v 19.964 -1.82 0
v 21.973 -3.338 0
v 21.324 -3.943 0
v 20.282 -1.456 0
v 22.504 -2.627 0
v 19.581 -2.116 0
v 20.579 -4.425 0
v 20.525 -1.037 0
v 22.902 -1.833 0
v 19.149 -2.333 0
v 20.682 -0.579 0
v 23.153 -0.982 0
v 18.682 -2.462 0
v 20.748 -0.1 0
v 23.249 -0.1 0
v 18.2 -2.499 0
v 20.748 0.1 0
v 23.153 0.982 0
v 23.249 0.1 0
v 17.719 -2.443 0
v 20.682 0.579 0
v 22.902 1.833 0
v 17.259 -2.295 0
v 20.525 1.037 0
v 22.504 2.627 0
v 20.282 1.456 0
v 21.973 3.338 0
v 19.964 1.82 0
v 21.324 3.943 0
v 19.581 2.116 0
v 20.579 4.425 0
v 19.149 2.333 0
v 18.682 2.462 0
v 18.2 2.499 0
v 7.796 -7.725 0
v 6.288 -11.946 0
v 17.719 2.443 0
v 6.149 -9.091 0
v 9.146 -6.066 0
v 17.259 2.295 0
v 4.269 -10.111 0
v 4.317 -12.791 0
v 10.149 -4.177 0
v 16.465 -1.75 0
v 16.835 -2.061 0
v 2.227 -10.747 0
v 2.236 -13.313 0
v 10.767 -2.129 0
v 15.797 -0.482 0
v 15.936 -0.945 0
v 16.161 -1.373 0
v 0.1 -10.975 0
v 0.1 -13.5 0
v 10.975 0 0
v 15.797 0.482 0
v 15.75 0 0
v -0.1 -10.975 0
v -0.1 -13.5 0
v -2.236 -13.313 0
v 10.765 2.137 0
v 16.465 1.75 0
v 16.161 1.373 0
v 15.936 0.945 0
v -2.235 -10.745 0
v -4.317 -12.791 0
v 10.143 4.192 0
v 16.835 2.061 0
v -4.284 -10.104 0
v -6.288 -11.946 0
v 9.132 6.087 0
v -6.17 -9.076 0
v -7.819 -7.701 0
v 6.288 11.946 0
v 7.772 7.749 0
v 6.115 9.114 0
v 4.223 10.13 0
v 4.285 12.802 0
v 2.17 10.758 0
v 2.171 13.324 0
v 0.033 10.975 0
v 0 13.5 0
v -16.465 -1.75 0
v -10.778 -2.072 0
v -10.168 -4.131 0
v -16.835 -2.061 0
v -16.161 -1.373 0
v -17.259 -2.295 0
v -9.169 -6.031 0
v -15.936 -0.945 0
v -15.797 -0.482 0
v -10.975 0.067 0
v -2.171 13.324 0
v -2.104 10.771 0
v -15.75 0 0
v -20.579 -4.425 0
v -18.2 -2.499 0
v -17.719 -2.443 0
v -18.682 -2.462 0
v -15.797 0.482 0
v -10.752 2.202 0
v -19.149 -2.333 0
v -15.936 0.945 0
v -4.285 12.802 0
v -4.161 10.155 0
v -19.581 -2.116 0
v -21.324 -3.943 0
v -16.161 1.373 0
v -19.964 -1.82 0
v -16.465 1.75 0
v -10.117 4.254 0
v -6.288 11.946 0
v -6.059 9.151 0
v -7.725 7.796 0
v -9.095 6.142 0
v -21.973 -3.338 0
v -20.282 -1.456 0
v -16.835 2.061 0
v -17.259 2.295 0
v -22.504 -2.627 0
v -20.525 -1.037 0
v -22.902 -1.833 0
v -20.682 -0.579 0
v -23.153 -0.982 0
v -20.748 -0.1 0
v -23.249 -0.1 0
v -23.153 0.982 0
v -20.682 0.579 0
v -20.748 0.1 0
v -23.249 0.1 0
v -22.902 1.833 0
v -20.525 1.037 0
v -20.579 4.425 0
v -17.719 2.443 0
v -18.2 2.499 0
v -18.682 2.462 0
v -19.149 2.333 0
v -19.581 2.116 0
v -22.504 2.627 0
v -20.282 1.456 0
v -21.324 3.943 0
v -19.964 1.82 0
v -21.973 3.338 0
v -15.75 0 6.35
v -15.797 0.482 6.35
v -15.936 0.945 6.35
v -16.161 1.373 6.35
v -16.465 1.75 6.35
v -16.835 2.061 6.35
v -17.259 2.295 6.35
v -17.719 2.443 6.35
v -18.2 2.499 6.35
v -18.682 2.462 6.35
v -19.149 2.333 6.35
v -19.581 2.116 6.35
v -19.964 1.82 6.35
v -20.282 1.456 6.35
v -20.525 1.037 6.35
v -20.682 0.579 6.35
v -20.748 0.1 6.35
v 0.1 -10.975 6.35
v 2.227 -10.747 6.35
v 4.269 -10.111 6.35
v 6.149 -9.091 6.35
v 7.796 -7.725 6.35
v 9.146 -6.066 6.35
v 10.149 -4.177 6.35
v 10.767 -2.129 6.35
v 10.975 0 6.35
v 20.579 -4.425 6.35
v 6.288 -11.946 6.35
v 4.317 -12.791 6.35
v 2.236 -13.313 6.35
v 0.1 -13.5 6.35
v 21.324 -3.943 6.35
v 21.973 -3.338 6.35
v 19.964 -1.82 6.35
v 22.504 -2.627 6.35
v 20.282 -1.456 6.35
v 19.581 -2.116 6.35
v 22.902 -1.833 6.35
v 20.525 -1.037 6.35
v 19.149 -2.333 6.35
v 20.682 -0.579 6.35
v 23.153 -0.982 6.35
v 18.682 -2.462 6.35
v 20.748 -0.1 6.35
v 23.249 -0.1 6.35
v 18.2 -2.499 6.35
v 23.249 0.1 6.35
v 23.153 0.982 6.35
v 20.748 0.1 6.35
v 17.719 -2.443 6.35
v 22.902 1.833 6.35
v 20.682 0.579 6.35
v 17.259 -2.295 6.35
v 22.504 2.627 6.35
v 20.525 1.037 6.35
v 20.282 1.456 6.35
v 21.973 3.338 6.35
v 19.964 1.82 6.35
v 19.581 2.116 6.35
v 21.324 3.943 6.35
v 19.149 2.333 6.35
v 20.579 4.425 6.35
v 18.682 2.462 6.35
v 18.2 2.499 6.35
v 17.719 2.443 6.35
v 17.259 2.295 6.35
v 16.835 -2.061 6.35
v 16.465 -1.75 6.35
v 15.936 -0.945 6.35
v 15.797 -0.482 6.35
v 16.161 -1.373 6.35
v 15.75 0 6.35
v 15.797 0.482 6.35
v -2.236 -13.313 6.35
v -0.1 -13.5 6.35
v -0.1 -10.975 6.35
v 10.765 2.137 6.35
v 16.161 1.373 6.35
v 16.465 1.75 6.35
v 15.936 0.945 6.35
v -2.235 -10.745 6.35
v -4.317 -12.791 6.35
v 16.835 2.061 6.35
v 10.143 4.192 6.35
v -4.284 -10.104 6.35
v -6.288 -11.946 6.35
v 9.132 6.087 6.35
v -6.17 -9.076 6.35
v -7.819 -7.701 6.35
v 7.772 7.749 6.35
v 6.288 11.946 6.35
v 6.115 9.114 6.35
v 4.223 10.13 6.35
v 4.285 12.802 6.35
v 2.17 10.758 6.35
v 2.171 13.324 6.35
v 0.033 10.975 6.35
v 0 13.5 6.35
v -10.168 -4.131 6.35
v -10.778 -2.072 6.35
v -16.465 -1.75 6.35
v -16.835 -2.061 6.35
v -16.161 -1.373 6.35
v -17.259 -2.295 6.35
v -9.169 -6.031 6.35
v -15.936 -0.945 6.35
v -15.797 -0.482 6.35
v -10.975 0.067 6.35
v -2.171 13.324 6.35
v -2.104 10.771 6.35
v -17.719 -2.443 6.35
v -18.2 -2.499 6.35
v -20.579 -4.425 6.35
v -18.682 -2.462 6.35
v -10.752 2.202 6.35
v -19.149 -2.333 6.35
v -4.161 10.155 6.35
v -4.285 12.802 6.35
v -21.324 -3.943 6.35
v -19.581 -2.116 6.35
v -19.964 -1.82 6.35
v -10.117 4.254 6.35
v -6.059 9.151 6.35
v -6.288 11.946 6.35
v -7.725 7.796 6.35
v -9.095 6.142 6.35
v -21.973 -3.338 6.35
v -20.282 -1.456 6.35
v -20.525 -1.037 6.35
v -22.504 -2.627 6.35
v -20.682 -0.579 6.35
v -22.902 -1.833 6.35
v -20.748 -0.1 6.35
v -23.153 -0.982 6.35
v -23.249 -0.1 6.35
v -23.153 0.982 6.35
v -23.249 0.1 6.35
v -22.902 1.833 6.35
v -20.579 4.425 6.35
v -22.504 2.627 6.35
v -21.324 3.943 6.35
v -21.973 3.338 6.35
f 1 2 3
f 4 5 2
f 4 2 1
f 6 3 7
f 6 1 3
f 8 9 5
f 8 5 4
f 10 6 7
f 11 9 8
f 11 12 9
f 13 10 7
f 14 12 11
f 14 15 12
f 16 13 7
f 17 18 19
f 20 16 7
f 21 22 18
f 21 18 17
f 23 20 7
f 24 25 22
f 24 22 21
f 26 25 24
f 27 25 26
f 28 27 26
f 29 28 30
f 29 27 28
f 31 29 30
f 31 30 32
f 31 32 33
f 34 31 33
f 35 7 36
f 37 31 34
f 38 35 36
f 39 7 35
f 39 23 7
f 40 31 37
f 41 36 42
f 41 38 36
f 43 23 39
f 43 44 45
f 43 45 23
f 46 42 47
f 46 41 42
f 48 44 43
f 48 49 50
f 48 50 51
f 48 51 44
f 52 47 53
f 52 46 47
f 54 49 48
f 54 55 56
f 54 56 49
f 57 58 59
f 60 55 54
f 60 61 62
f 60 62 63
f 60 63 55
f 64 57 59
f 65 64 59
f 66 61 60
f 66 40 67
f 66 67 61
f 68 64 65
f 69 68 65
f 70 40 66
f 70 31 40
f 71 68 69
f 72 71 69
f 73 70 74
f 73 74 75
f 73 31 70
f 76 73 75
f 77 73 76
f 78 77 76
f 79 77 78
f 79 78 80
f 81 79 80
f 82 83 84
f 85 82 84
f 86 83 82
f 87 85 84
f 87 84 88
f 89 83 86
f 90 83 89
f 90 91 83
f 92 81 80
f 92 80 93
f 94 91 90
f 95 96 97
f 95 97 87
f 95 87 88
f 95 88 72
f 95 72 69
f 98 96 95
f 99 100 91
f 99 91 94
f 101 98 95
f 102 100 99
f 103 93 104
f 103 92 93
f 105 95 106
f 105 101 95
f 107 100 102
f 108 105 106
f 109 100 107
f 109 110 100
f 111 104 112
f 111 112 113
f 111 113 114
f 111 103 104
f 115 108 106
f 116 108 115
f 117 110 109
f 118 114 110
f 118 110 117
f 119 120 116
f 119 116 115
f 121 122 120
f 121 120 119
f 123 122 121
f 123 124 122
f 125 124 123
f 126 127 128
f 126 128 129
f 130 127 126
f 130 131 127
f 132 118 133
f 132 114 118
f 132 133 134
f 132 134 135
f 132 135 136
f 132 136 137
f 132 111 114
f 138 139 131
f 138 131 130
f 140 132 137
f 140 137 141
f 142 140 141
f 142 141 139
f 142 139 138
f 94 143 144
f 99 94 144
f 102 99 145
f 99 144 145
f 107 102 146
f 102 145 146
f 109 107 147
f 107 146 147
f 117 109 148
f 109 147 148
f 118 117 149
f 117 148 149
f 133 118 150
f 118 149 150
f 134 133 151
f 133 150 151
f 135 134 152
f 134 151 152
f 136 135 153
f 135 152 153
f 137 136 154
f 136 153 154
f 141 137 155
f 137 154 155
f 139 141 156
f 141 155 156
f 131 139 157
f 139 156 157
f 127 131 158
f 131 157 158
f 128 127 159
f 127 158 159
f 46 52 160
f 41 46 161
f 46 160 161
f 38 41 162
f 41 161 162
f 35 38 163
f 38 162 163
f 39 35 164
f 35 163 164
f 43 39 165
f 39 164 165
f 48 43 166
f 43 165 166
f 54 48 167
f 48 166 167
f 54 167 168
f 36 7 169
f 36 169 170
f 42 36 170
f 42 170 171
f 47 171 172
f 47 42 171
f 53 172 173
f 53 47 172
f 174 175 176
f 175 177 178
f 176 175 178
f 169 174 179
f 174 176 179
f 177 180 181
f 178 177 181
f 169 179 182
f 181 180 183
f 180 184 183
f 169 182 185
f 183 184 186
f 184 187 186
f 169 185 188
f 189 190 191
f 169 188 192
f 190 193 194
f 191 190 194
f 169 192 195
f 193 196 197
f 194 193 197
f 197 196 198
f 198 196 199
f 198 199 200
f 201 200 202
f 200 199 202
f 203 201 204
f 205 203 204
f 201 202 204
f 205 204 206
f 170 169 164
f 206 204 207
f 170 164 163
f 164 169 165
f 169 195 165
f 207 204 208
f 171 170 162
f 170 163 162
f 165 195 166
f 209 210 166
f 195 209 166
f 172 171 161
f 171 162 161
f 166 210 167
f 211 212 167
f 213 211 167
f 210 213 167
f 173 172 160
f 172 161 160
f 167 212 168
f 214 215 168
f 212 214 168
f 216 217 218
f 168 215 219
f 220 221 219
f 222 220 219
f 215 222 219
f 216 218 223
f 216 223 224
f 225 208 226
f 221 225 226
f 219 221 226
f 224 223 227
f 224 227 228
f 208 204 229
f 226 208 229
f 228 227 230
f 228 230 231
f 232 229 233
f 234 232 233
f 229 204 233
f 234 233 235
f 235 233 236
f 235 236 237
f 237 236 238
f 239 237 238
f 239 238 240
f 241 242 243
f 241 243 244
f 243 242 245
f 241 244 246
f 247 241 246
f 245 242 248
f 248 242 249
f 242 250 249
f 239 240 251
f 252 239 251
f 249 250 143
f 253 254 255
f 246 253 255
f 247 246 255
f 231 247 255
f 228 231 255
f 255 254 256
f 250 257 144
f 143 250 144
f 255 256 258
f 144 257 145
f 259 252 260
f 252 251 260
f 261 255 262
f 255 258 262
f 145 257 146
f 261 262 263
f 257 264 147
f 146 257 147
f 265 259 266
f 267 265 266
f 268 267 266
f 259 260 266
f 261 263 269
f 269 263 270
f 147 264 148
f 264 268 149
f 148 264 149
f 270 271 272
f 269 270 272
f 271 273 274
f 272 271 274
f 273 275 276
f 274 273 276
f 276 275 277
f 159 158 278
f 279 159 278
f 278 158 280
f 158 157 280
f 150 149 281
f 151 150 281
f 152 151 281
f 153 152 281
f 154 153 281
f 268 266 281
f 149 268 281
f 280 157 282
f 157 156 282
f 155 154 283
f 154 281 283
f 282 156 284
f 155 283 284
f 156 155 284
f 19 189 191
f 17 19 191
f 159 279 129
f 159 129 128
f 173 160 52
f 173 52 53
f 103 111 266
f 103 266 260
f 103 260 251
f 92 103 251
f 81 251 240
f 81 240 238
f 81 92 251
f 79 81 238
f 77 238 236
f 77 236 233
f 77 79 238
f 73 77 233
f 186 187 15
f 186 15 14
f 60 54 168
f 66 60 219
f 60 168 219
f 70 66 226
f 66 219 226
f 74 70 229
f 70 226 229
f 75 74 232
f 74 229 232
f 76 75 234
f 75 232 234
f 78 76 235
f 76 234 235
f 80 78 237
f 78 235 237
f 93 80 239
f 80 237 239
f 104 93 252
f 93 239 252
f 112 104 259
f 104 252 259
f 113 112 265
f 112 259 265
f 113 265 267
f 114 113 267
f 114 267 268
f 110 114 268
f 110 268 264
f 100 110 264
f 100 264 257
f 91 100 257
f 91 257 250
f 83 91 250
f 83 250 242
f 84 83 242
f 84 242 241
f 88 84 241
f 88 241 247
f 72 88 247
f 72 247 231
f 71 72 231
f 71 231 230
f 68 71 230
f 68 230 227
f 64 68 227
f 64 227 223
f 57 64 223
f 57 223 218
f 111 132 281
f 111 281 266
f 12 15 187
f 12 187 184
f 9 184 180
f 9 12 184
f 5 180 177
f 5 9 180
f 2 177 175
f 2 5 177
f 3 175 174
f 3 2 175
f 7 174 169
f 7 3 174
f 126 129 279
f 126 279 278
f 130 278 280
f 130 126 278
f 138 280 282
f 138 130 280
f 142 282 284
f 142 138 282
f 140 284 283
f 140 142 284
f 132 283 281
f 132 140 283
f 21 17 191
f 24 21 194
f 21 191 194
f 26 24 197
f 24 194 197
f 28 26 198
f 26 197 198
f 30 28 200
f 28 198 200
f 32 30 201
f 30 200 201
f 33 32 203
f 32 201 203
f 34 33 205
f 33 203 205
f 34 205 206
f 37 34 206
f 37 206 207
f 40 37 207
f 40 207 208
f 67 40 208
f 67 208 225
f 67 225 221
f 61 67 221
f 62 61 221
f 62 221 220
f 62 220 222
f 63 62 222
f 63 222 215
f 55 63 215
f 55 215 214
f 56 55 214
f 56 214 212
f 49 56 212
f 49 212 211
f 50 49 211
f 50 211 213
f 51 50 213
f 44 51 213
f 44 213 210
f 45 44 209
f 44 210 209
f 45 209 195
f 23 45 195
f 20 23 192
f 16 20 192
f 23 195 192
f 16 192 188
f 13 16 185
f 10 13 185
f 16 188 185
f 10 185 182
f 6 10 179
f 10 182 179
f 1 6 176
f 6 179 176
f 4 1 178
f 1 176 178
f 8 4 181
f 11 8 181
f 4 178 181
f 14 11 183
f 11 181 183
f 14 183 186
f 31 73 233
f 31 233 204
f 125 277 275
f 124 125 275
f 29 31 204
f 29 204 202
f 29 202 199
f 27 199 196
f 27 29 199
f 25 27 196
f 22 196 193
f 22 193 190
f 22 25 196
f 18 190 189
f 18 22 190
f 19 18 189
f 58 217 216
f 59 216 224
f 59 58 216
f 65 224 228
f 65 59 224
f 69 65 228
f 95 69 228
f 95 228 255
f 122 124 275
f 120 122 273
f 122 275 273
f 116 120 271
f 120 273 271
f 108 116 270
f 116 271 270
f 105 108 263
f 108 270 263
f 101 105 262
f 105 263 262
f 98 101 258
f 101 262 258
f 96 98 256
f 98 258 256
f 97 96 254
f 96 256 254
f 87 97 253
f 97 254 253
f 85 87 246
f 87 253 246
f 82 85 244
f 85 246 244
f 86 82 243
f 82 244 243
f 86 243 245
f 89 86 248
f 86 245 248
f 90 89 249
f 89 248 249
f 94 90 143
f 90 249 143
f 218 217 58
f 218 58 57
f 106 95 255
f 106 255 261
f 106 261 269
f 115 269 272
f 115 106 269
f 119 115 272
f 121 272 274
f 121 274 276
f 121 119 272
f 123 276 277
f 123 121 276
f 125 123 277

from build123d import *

# Parameters (mm, degrees)
RESSALTO_EXTRUS_O1_DEPTH = 6.35
ESBO_O2_R                = 10.975
ESBO_O2_R_2              = 2.5
CORTE_EXTRUS_O1_DEPTH    = 28.62489819
CORTE_EXTRUS_O2_DEPTH    = 28.62489819
ESBO_O4_W                = 5
ESBO_O4_H                = 0.2
CORTE_EXTRUS_O3_DEPTH    = 28.62489819


with BuildPart() as part:
    # Esboço1 → Ressalto-extrusão1 (new body)
    with BuildSketch(Plane.XY):
        with BuildLine():
            Line((-20.578767123, 4.424572712), (-6.287671233, 11.946346323))
            ThreePointArc((-6.287671233, 11.946346323), (0, 13.5), (6.287671233, 11.946346323))
            Line((6.287671233, 11.946346323), (20.578767123, 4.424572712))
            ThreePointArc((20.578767123, 4.424572712), (23.25, 0), (20.578767123, -4.424572712))
            Line((20.578767123, -4.424572712), (6.287671233, -11.946346323))
            ThreePointArc((6.287671233, -11.946346323), (0, -13.5), (-6.287671233, -11.946346323))
            Line((-6.287671233, -11.946346323), (-20.578767123, -4.424572712))
            ThreePointArc((-20.578767123, -4.424572712), (-23.25, 0), (-20.578767123, 4.424572712))
        make_face()
    extrude(amount=RESSALTO_EXTRUS_O1_DEPTH)

    # Esboço2 → Corte-extrusão1 (cut, through all)
    with BuildSketch(Plane.XY.offset(6.35)):
        Circle(ESBO_O2_R)
        with Locations((-18.25, 0)):
            Circle(ESBO_O2_R_2)
        with Locations((18.25, 0)):
            Circle(ESBO_O2_R_2)
    extrude(amount=-CORTE_EXTRUS_O1_DEPTH, mode=Mode.SUBTRACT)

    # Esboço3 → Corte-extrusão2 (cut, through all)
    with BuildSketch(Plane.XY.offset(6.35)):
        with BuildLine():
            Line((0.1, -10.97454441), (0.1, -13.499629625))
            ThreePointArc((0.1, -13.499629625), (0, -13.5), (-0.1, -13.499629625))
            Line((-0.1, -13.499629625), (-0.1, -10.97454441))
            ThreePointArc((-0.1, -10.97454441), (0, -10.975), (0.1, -10.97454441))
        make_face()
    extrude(amount=-CORTE_EXTRUS_O2_DEPTH, mode=Mode.SUBTRACT)

    # Esboço4 → Corte-extrusão3 (cut, through all)
    with BuildSketch(Plane.XY.offset(6.35)):
        with Locations((-20.75, 0)):
            Rectangle(ESBO_O4_W, ESBO_O4_H)
    corte_extrus_o3 = extrude(amount=-CORTE_EXTRUS_O3_DEPTH, mode=Mode.SUBTRACT)

    # Espelhar1: Corte-extrusão3 across plane
    add(corte_extrus_o3.mirror(Plane(origin=(0, 0, 0), x_dir=(0, 0, 1), z_dir=(1, 0, 0))), mode=Mode.SUBTRACT)


solid = part.part
